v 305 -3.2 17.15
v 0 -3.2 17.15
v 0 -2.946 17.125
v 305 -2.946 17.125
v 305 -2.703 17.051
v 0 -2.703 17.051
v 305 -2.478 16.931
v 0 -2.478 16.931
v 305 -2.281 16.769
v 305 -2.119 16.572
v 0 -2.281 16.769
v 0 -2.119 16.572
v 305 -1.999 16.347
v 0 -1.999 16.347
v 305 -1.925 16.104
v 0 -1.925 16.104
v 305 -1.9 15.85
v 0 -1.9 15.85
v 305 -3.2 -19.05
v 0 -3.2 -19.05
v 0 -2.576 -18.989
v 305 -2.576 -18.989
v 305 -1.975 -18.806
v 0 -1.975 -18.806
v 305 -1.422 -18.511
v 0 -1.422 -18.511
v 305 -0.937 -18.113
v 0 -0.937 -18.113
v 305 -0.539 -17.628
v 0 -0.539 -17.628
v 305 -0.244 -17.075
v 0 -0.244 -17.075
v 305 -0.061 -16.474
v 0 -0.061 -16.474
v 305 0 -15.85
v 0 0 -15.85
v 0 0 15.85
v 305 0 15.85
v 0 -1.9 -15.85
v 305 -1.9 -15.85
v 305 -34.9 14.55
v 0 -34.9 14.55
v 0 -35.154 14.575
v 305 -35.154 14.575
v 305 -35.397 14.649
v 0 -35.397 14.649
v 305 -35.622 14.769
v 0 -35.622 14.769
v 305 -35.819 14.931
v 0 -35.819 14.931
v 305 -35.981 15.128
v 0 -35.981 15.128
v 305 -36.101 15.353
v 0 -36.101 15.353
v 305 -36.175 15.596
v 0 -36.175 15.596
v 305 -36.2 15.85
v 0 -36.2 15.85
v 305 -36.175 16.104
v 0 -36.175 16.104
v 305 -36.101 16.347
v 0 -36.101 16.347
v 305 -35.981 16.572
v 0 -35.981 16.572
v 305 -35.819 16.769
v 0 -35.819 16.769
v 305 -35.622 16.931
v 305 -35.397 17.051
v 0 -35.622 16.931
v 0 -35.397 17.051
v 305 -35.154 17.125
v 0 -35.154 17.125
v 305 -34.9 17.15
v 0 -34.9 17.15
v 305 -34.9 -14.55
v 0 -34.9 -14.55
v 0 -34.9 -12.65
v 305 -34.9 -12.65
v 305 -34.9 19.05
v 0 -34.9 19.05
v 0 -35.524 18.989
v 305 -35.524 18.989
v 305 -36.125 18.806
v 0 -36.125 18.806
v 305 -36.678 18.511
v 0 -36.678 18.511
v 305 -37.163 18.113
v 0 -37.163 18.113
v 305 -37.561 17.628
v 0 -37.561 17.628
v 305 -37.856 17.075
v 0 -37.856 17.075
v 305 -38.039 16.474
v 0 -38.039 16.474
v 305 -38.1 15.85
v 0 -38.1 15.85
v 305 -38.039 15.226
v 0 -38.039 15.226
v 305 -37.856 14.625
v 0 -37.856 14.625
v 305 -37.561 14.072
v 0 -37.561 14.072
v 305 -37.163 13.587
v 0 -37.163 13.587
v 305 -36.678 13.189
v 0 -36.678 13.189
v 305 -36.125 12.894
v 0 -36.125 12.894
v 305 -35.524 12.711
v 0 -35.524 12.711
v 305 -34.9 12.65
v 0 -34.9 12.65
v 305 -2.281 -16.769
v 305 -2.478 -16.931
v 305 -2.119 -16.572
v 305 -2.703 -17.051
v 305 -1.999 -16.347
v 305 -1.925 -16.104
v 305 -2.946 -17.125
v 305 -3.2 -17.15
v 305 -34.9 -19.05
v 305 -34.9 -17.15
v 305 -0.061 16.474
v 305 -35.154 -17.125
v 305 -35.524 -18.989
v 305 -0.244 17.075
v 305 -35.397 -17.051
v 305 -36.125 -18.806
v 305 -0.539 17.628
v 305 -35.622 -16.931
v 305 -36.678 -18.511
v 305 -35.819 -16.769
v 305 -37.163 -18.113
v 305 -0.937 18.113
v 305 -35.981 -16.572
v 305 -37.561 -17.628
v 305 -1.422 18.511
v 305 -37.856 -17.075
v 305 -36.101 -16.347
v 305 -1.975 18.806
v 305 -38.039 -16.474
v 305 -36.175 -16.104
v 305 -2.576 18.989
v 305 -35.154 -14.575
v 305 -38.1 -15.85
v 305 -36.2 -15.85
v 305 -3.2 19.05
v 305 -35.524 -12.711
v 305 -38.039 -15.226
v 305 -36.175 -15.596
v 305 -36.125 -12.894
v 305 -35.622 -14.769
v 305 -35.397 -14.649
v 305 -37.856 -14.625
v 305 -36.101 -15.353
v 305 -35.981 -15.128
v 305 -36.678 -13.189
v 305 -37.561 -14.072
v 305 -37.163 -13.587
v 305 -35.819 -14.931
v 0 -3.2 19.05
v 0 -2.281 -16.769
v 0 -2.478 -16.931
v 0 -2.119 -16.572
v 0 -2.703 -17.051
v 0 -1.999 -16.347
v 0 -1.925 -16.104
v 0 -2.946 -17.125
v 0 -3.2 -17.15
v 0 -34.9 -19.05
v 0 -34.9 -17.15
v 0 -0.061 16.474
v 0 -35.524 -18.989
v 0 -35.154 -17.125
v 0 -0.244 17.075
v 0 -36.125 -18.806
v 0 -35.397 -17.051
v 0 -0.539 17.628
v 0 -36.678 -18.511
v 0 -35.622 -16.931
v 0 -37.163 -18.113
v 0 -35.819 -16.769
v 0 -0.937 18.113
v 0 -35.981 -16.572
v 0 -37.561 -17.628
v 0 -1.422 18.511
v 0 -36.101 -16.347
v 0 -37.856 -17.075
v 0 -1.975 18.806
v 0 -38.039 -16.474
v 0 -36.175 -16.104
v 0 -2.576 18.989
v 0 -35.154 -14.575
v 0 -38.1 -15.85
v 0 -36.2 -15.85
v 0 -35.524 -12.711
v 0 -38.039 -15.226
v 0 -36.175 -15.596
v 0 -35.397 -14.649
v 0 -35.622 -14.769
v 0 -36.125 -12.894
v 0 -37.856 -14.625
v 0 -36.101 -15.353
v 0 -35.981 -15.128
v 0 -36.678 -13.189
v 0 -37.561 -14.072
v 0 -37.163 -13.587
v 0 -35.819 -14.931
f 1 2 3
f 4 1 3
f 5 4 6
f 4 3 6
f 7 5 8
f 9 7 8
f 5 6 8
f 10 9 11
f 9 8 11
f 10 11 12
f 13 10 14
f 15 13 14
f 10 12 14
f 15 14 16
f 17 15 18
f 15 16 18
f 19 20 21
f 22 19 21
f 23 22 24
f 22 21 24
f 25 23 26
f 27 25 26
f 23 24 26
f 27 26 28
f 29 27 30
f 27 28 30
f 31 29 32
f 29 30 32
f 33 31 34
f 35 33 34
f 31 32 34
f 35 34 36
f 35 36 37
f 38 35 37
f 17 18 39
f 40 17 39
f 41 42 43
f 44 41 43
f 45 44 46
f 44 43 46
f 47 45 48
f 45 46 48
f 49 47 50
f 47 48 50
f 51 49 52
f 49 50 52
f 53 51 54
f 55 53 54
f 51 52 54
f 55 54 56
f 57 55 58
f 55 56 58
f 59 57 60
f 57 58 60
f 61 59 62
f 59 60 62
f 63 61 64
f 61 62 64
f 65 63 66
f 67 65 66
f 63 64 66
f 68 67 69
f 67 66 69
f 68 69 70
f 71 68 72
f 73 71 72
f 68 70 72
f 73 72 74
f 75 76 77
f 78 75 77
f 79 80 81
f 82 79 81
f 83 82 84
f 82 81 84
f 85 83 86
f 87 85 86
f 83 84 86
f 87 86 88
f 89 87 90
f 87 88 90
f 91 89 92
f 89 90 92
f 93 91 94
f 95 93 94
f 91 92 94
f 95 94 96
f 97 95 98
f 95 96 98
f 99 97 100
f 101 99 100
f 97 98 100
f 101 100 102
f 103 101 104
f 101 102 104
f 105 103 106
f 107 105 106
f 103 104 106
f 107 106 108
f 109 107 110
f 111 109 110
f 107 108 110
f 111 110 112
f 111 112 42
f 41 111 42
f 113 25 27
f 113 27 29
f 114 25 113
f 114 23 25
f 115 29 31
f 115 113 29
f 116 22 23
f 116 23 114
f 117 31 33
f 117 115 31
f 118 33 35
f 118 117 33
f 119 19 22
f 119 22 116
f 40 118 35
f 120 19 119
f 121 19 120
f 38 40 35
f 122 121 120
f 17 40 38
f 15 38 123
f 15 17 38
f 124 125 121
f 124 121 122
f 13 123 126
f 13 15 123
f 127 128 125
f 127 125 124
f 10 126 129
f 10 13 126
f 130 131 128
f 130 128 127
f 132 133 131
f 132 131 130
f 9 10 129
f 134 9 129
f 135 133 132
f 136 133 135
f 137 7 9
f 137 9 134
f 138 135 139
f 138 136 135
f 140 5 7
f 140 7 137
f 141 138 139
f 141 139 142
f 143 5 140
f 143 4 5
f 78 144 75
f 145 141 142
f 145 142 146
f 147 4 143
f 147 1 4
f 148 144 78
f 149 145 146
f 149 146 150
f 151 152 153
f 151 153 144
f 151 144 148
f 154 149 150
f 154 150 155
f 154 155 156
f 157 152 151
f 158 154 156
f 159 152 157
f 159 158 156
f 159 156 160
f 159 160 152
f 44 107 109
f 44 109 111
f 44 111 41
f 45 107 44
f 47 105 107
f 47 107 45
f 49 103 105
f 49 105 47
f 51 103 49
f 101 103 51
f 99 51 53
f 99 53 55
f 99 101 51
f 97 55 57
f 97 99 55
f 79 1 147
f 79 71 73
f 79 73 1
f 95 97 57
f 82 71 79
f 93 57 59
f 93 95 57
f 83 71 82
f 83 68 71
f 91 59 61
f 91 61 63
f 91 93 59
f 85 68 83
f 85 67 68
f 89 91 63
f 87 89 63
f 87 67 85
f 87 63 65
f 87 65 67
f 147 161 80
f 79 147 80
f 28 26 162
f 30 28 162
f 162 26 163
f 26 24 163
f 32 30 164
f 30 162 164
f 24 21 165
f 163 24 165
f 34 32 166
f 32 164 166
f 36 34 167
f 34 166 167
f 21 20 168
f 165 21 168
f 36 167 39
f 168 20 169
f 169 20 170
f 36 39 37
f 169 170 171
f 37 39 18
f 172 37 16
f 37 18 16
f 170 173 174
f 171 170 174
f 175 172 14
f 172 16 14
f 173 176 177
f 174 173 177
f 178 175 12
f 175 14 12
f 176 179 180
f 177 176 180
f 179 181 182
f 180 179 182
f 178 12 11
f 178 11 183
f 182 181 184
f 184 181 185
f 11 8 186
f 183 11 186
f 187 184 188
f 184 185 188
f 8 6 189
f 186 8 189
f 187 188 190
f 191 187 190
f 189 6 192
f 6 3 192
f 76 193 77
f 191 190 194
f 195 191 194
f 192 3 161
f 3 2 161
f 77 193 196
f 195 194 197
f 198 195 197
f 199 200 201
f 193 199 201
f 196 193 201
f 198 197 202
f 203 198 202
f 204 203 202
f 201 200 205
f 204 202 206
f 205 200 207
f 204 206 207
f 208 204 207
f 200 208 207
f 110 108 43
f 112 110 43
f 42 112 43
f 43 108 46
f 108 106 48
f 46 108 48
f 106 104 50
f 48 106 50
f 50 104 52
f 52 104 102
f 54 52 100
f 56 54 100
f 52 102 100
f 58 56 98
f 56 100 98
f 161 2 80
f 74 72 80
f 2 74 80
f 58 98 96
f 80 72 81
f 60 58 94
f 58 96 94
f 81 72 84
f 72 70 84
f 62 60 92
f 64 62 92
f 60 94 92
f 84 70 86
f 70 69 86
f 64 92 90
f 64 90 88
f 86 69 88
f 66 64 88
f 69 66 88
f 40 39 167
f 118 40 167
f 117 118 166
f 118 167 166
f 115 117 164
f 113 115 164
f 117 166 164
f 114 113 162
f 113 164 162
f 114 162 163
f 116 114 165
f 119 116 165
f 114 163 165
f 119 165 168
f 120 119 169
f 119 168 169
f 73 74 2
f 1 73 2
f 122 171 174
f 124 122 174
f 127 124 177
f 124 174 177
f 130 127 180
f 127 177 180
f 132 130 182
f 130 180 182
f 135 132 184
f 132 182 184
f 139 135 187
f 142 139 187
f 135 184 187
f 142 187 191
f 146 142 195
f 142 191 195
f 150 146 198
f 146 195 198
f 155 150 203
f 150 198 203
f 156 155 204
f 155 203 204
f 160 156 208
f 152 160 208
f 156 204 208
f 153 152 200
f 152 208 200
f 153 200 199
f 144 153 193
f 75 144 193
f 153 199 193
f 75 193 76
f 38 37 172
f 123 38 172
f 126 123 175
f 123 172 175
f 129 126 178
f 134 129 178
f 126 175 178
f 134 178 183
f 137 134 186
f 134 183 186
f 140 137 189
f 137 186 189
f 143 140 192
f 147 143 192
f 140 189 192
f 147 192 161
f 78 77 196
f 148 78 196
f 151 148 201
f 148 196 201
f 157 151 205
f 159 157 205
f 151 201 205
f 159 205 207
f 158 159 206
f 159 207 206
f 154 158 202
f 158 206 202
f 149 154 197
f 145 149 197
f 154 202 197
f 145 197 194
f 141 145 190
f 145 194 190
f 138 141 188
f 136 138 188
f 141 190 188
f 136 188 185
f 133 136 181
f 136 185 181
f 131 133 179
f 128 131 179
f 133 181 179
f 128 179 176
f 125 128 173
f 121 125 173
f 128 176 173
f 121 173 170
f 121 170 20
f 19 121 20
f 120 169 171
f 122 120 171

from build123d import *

# Parameters (mm, degrees)
CHANNEL_DEPTH = 305


with BuildPart() as part:
    # Sketch1 → Channel (new body)
    with BuildSketch(Plane(origin=(0, 39.243400922, 0), x_dir=(0, 0, 1), z_dir=(1, 0, 0))):
        with BuildLine():
            ThreePointArc((-12.65, 74.143400922), (-15.85, 77.343400922), (-19.05, 74.143400922))
            Line((-19.05, 74.143400922), (-19.05, 42.443400922))
            ThreePointArc((-19.05, 42.443400922), (-18.1127417, 40.180659222), (-15.85, 39.243400922))
            Line((-15.85, 39.243400922), (15.85, 39.243400922))
            ThreePointArc((15.85, 39.243400922), (18.1127417, 40.180659222), (19.05, 42.443400922))
            Line((19.05, 42.443400922), (19.05, 74.143400922))
            ThreePointArc((19.05, 74.143400922), (15.85, 77.343400922), (12.65, 74.143400922))
            Line((12.65, 74.143400922), (14.55, 74.143400922))
            ThreePointArc((14.55, 74.143400922), (15.85, 75.443400922), (17.15, 74.143400922))
            Line((17.15, 74.143400922), (17.15, 42.443400922))
            ThreePointArc((17.15, 42.443400922), (16.769238816, 41.524162106), (15.85, 41.143400922))
            Line((15.85, 41.143400922), (-15.85, 41.143400922))
            ThreePointArc((-15.85, 41.143400922), (-16.769238816, 41.524162106), (-17.15, 42.443400922))
            Line((-17.15, 42.443400922), (-17.15, 74.143400922))
            ThreePointArc((-17.15, 74.143400922), (-15.85, 75.443400922), (-14.55, 74.143400922))
            Line((-14.55, 74.143400922), (-12.65, 74.143400922))
        make_face()
    extrude(amount=CHANNEL_DEPTH)


solid = part.part
